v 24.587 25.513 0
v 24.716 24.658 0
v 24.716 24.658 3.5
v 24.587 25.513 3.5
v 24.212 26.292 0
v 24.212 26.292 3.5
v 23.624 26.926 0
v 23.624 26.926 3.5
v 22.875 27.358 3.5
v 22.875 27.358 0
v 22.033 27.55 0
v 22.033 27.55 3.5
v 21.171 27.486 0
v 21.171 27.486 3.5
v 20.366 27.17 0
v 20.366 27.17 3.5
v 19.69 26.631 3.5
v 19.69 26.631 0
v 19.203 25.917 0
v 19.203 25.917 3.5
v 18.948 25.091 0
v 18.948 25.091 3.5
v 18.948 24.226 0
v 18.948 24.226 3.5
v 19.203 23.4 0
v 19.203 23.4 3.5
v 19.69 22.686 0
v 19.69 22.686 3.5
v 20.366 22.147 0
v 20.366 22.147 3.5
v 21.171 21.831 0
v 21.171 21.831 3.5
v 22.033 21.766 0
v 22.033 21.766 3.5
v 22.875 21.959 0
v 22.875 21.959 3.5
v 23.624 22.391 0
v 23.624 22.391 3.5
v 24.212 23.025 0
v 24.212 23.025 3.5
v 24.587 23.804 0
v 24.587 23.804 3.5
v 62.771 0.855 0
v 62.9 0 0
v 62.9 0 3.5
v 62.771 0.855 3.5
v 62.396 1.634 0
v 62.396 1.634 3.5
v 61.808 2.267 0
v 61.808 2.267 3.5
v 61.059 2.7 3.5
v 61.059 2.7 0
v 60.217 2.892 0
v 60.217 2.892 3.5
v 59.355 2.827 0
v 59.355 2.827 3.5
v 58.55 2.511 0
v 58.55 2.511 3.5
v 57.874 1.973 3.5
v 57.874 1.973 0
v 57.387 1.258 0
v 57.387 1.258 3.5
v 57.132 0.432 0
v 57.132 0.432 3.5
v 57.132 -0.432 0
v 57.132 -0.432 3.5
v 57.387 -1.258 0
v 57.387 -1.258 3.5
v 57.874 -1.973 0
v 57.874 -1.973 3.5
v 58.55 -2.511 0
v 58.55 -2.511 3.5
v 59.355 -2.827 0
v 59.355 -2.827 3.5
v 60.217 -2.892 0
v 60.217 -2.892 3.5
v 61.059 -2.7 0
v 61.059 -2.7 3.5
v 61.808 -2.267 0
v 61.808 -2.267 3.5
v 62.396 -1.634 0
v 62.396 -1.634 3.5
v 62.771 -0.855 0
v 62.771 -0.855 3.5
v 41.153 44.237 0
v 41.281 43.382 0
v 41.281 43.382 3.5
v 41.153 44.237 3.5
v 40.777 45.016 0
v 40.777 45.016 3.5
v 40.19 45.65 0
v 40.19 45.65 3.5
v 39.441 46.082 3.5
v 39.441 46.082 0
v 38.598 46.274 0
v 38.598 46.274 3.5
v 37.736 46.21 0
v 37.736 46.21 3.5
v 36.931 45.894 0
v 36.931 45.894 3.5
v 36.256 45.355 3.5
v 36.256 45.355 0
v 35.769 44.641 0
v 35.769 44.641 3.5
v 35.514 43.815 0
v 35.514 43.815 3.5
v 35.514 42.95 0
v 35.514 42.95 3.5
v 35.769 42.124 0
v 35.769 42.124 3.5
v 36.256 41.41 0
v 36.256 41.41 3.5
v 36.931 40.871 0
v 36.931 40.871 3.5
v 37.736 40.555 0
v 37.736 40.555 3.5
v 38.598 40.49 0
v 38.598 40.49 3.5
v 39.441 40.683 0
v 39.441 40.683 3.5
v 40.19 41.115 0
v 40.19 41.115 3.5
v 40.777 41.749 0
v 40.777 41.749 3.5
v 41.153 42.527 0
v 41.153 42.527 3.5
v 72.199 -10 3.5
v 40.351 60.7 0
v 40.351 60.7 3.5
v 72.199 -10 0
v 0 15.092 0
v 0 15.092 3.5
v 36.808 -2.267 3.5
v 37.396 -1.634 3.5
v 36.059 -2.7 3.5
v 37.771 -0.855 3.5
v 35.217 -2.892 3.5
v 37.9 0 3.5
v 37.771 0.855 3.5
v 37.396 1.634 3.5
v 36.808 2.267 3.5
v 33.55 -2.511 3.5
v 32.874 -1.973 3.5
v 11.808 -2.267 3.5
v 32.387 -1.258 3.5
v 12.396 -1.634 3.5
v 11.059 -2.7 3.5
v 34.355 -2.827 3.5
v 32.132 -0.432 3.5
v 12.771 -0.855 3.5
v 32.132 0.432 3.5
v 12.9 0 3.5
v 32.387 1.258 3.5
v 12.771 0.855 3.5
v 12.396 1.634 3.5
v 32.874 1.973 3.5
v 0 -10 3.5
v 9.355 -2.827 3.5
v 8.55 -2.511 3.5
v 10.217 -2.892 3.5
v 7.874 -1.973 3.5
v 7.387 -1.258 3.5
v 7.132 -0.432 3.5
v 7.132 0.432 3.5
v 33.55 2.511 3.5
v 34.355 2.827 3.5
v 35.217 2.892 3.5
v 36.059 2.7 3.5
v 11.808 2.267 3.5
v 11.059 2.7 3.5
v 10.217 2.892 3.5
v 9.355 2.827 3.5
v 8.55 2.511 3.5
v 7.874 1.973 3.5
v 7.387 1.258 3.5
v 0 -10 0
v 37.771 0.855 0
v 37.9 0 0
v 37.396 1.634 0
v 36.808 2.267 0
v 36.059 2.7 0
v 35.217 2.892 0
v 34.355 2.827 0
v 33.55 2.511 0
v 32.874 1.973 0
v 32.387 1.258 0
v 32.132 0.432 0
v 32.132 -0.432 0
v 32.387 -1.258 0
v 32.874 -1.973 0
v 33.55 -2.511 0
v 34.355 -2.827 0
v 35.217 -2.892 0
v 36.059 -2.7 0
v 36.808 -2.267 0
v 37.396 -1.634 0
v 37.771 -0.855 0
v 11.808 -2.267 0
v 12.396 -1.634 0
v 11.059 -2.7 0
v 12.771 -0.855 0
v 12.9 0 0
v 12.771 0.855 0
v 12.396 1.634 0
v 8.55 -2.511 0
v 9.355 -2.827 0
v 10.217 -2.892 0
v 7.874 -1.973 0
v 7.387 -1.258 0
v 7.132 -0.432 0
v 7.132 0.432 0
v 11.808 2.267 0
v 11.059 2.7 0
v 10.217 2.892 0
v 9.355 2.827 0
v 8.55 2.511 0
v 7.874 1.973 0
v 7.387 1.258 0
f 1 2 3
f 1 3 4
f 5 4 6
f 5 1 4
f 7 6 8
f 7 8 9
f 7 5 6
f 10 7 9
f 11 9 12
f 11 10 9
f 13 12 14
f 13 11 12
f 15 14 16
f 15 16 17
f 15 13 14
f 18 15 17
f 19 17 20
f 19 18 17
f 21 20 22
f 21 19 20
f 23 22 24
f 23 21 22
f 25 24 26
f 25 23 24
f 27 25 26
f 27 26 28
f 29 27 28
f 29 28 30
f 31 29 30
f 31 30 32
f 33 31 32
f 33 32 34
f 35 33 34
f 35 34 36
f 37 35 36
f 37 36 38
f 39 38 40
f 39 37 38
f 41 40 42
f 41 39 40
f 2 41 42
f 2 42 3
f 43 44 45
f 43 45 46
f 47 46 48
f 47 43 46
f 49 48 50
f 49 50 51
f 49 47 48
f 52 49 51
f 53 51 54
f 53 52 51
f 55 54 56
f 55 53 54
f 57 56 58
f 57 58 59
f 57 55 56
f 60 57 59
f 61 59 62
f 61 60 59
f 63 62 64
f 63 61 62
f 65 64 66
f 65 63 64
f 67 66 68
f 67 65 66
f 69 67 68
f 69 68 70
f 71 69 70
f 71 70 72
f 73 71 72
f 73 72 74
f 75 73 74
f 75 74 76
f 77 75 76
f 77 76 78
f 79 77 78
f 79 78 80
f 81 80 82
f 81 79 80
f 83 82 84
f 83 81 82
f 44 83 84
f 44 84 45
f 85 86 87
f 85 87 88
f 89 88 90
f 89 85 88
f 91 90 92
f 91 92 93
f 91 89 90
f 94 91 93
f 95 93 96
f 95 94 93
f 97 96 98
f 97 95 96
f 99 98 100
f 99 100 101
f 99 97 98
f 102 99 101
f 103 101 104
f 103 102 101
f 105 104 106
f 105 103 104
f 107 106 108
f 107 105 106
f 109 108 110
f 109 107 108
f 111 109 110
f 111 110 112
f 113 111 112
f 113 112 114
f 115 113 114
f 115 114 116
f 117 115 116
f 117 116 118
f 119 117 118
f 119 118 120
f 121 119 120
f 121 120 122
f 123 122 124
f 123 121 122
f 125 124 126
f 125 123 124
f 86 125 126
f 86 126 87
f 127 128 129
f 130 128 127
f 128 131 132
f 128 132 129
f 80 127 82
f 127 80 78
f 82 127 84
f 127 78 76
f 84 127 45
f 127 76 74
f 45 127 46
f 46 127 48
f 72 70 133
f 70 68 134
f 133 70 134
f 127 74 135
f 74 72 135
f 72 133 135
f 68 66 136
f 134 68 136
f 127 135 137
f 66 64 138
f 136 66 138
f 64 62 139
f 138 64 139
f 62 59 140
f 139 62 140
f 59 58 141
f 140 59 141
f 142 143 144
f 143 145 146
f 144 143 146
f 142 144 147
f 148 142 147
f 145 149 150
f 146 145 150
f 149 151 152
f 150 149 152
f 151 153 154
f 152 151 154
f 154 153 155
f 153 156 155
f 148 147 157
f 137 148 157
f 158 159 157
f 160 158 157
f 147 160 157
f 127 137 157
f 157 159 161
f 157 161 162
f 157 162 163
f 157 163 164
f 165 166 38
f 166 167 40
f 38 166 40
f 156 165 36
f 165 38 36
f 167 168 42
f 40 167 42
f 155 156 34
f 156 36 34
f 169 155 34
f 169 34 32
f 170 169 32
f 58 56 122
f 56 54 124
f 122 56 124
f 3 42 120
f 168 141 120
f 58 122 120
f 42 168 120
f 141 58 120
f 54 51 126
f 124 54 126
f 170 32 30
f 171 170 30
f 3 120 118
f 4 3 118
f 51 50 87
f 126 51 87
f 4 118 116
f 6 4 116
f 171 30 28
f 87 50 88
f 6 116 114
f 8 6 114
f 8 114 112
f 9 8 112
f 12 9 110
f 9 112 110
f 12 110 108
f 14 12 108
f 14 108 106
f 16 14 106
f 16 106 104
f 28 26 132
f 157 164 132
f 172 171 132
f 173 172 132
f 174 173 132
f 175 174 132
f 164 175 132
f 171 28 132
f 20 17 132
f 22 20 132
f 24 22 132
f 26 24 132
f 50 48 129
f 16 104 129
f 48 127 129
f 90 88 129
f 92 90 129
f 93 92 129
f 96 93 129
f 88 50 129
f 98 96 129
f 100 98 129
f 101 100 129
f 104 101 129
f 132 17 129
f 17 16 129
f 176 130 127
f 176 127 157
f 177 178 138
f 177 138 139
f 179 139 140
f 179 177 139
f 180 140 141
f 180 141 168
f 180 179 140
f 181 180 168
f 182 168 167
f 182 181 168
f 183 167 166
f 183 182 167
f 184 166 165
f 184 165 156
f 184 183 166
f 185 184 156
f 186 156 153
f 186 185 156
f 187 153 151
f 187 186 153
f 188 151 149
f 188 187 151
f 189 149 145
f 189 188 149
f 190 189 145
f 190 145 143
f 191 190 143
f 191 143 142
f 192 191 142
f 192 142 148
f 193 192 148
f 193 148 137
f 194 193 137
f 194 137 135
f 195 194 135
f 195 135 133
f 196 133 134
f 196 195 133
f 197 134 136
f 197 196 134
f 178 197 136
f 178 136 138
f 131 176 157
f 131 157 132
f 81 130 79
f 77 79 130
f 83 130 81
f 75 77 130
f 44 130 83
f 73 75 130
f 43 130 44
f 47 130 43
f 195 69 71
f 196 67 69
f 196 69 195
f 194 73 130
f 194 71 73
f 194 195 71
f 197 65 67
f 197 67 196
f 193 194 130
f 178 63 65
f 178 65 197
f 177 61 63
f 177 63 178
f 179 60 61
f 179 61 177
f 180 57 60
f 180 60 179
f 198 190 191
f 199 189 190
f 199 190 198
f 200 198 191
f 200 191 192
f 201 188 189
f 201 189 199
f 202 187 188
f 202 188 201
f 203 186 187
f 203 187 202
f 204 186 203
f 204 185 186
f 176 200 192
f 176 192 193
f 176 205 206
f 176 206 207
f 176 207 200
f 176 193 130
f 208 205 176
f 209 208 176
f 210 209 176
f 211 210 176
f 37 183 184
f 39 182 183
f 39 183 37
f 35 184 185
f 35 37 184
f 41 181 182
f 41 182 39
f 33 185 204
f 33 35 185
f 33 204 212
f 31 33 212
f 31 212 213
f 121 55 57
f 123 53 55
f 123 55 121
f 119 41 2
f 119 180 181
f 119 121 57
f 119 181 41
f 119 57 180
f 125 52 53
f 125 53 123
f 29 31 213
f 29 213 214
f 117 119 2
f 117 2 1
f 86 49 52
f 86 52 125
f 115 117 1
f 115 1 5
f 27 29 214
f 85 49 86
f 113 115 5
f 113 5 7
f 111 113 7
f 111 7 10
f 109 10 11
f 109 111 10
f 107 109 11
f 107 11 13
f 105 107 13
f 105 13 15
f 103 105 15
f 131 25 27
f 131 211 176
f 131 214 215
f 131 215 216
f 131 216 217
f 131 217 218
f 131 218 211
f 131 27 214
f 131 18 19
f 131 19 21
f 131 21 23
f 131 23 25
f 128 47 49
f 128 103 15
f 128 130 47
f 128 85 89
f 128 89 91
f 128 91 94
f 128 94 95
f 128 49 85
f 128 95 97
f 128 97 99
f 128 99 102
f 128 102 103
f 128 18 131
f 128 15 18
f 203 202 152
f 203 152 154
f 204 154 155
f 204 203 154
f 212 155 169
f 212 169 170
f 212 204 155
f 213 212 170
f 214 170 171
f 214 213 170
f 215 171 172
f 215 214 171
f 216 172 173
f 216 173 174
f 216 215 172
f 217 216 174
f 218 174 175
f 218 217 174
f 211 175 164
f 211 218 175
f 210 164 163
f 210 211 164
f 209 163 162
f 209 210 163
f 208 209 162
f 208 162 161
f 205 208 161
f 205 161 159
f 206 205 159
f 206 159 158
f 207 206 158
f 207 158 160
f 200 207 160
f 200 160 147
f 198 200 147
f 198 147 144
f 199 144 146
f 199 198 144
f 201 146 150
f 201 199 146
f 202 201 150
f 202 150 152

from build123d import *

# Parameters (mm, degrees)
SKETCH_R  = 2.9
PAD_DEPTH = 3.5


with BuildPart() as part:
    # Sketch → Pad (new body)
    with BuildSketch(Plane.XY):
        Polygon((0, -10), (0, 15.091605), (40.351065, 60.700187), (72.199177, -10), align=None)
        with Locations((21.815896, 24.658385)):
            Circle(SKETCH_R, mode=Mode.SUBTRACT)
        with Locations((38.381398, 43.382278)):
            Circle(SKETCH_R, mode=Mode.SUBTRACT)
        with Locations((60, 0)):
            Circle(SKETCH_R, mode=Mode.SUBTRACT)
        with Locations((35, 0)):
            Circle(SKETCH_R, mode=Mode.SUBTRACT)
        with Locations((10, 0)):
            Circle(SKETCH_R, mode=Mode.SUBTRACT)
    extrude(amount=PAD_DEPTH)


solid = part.part
